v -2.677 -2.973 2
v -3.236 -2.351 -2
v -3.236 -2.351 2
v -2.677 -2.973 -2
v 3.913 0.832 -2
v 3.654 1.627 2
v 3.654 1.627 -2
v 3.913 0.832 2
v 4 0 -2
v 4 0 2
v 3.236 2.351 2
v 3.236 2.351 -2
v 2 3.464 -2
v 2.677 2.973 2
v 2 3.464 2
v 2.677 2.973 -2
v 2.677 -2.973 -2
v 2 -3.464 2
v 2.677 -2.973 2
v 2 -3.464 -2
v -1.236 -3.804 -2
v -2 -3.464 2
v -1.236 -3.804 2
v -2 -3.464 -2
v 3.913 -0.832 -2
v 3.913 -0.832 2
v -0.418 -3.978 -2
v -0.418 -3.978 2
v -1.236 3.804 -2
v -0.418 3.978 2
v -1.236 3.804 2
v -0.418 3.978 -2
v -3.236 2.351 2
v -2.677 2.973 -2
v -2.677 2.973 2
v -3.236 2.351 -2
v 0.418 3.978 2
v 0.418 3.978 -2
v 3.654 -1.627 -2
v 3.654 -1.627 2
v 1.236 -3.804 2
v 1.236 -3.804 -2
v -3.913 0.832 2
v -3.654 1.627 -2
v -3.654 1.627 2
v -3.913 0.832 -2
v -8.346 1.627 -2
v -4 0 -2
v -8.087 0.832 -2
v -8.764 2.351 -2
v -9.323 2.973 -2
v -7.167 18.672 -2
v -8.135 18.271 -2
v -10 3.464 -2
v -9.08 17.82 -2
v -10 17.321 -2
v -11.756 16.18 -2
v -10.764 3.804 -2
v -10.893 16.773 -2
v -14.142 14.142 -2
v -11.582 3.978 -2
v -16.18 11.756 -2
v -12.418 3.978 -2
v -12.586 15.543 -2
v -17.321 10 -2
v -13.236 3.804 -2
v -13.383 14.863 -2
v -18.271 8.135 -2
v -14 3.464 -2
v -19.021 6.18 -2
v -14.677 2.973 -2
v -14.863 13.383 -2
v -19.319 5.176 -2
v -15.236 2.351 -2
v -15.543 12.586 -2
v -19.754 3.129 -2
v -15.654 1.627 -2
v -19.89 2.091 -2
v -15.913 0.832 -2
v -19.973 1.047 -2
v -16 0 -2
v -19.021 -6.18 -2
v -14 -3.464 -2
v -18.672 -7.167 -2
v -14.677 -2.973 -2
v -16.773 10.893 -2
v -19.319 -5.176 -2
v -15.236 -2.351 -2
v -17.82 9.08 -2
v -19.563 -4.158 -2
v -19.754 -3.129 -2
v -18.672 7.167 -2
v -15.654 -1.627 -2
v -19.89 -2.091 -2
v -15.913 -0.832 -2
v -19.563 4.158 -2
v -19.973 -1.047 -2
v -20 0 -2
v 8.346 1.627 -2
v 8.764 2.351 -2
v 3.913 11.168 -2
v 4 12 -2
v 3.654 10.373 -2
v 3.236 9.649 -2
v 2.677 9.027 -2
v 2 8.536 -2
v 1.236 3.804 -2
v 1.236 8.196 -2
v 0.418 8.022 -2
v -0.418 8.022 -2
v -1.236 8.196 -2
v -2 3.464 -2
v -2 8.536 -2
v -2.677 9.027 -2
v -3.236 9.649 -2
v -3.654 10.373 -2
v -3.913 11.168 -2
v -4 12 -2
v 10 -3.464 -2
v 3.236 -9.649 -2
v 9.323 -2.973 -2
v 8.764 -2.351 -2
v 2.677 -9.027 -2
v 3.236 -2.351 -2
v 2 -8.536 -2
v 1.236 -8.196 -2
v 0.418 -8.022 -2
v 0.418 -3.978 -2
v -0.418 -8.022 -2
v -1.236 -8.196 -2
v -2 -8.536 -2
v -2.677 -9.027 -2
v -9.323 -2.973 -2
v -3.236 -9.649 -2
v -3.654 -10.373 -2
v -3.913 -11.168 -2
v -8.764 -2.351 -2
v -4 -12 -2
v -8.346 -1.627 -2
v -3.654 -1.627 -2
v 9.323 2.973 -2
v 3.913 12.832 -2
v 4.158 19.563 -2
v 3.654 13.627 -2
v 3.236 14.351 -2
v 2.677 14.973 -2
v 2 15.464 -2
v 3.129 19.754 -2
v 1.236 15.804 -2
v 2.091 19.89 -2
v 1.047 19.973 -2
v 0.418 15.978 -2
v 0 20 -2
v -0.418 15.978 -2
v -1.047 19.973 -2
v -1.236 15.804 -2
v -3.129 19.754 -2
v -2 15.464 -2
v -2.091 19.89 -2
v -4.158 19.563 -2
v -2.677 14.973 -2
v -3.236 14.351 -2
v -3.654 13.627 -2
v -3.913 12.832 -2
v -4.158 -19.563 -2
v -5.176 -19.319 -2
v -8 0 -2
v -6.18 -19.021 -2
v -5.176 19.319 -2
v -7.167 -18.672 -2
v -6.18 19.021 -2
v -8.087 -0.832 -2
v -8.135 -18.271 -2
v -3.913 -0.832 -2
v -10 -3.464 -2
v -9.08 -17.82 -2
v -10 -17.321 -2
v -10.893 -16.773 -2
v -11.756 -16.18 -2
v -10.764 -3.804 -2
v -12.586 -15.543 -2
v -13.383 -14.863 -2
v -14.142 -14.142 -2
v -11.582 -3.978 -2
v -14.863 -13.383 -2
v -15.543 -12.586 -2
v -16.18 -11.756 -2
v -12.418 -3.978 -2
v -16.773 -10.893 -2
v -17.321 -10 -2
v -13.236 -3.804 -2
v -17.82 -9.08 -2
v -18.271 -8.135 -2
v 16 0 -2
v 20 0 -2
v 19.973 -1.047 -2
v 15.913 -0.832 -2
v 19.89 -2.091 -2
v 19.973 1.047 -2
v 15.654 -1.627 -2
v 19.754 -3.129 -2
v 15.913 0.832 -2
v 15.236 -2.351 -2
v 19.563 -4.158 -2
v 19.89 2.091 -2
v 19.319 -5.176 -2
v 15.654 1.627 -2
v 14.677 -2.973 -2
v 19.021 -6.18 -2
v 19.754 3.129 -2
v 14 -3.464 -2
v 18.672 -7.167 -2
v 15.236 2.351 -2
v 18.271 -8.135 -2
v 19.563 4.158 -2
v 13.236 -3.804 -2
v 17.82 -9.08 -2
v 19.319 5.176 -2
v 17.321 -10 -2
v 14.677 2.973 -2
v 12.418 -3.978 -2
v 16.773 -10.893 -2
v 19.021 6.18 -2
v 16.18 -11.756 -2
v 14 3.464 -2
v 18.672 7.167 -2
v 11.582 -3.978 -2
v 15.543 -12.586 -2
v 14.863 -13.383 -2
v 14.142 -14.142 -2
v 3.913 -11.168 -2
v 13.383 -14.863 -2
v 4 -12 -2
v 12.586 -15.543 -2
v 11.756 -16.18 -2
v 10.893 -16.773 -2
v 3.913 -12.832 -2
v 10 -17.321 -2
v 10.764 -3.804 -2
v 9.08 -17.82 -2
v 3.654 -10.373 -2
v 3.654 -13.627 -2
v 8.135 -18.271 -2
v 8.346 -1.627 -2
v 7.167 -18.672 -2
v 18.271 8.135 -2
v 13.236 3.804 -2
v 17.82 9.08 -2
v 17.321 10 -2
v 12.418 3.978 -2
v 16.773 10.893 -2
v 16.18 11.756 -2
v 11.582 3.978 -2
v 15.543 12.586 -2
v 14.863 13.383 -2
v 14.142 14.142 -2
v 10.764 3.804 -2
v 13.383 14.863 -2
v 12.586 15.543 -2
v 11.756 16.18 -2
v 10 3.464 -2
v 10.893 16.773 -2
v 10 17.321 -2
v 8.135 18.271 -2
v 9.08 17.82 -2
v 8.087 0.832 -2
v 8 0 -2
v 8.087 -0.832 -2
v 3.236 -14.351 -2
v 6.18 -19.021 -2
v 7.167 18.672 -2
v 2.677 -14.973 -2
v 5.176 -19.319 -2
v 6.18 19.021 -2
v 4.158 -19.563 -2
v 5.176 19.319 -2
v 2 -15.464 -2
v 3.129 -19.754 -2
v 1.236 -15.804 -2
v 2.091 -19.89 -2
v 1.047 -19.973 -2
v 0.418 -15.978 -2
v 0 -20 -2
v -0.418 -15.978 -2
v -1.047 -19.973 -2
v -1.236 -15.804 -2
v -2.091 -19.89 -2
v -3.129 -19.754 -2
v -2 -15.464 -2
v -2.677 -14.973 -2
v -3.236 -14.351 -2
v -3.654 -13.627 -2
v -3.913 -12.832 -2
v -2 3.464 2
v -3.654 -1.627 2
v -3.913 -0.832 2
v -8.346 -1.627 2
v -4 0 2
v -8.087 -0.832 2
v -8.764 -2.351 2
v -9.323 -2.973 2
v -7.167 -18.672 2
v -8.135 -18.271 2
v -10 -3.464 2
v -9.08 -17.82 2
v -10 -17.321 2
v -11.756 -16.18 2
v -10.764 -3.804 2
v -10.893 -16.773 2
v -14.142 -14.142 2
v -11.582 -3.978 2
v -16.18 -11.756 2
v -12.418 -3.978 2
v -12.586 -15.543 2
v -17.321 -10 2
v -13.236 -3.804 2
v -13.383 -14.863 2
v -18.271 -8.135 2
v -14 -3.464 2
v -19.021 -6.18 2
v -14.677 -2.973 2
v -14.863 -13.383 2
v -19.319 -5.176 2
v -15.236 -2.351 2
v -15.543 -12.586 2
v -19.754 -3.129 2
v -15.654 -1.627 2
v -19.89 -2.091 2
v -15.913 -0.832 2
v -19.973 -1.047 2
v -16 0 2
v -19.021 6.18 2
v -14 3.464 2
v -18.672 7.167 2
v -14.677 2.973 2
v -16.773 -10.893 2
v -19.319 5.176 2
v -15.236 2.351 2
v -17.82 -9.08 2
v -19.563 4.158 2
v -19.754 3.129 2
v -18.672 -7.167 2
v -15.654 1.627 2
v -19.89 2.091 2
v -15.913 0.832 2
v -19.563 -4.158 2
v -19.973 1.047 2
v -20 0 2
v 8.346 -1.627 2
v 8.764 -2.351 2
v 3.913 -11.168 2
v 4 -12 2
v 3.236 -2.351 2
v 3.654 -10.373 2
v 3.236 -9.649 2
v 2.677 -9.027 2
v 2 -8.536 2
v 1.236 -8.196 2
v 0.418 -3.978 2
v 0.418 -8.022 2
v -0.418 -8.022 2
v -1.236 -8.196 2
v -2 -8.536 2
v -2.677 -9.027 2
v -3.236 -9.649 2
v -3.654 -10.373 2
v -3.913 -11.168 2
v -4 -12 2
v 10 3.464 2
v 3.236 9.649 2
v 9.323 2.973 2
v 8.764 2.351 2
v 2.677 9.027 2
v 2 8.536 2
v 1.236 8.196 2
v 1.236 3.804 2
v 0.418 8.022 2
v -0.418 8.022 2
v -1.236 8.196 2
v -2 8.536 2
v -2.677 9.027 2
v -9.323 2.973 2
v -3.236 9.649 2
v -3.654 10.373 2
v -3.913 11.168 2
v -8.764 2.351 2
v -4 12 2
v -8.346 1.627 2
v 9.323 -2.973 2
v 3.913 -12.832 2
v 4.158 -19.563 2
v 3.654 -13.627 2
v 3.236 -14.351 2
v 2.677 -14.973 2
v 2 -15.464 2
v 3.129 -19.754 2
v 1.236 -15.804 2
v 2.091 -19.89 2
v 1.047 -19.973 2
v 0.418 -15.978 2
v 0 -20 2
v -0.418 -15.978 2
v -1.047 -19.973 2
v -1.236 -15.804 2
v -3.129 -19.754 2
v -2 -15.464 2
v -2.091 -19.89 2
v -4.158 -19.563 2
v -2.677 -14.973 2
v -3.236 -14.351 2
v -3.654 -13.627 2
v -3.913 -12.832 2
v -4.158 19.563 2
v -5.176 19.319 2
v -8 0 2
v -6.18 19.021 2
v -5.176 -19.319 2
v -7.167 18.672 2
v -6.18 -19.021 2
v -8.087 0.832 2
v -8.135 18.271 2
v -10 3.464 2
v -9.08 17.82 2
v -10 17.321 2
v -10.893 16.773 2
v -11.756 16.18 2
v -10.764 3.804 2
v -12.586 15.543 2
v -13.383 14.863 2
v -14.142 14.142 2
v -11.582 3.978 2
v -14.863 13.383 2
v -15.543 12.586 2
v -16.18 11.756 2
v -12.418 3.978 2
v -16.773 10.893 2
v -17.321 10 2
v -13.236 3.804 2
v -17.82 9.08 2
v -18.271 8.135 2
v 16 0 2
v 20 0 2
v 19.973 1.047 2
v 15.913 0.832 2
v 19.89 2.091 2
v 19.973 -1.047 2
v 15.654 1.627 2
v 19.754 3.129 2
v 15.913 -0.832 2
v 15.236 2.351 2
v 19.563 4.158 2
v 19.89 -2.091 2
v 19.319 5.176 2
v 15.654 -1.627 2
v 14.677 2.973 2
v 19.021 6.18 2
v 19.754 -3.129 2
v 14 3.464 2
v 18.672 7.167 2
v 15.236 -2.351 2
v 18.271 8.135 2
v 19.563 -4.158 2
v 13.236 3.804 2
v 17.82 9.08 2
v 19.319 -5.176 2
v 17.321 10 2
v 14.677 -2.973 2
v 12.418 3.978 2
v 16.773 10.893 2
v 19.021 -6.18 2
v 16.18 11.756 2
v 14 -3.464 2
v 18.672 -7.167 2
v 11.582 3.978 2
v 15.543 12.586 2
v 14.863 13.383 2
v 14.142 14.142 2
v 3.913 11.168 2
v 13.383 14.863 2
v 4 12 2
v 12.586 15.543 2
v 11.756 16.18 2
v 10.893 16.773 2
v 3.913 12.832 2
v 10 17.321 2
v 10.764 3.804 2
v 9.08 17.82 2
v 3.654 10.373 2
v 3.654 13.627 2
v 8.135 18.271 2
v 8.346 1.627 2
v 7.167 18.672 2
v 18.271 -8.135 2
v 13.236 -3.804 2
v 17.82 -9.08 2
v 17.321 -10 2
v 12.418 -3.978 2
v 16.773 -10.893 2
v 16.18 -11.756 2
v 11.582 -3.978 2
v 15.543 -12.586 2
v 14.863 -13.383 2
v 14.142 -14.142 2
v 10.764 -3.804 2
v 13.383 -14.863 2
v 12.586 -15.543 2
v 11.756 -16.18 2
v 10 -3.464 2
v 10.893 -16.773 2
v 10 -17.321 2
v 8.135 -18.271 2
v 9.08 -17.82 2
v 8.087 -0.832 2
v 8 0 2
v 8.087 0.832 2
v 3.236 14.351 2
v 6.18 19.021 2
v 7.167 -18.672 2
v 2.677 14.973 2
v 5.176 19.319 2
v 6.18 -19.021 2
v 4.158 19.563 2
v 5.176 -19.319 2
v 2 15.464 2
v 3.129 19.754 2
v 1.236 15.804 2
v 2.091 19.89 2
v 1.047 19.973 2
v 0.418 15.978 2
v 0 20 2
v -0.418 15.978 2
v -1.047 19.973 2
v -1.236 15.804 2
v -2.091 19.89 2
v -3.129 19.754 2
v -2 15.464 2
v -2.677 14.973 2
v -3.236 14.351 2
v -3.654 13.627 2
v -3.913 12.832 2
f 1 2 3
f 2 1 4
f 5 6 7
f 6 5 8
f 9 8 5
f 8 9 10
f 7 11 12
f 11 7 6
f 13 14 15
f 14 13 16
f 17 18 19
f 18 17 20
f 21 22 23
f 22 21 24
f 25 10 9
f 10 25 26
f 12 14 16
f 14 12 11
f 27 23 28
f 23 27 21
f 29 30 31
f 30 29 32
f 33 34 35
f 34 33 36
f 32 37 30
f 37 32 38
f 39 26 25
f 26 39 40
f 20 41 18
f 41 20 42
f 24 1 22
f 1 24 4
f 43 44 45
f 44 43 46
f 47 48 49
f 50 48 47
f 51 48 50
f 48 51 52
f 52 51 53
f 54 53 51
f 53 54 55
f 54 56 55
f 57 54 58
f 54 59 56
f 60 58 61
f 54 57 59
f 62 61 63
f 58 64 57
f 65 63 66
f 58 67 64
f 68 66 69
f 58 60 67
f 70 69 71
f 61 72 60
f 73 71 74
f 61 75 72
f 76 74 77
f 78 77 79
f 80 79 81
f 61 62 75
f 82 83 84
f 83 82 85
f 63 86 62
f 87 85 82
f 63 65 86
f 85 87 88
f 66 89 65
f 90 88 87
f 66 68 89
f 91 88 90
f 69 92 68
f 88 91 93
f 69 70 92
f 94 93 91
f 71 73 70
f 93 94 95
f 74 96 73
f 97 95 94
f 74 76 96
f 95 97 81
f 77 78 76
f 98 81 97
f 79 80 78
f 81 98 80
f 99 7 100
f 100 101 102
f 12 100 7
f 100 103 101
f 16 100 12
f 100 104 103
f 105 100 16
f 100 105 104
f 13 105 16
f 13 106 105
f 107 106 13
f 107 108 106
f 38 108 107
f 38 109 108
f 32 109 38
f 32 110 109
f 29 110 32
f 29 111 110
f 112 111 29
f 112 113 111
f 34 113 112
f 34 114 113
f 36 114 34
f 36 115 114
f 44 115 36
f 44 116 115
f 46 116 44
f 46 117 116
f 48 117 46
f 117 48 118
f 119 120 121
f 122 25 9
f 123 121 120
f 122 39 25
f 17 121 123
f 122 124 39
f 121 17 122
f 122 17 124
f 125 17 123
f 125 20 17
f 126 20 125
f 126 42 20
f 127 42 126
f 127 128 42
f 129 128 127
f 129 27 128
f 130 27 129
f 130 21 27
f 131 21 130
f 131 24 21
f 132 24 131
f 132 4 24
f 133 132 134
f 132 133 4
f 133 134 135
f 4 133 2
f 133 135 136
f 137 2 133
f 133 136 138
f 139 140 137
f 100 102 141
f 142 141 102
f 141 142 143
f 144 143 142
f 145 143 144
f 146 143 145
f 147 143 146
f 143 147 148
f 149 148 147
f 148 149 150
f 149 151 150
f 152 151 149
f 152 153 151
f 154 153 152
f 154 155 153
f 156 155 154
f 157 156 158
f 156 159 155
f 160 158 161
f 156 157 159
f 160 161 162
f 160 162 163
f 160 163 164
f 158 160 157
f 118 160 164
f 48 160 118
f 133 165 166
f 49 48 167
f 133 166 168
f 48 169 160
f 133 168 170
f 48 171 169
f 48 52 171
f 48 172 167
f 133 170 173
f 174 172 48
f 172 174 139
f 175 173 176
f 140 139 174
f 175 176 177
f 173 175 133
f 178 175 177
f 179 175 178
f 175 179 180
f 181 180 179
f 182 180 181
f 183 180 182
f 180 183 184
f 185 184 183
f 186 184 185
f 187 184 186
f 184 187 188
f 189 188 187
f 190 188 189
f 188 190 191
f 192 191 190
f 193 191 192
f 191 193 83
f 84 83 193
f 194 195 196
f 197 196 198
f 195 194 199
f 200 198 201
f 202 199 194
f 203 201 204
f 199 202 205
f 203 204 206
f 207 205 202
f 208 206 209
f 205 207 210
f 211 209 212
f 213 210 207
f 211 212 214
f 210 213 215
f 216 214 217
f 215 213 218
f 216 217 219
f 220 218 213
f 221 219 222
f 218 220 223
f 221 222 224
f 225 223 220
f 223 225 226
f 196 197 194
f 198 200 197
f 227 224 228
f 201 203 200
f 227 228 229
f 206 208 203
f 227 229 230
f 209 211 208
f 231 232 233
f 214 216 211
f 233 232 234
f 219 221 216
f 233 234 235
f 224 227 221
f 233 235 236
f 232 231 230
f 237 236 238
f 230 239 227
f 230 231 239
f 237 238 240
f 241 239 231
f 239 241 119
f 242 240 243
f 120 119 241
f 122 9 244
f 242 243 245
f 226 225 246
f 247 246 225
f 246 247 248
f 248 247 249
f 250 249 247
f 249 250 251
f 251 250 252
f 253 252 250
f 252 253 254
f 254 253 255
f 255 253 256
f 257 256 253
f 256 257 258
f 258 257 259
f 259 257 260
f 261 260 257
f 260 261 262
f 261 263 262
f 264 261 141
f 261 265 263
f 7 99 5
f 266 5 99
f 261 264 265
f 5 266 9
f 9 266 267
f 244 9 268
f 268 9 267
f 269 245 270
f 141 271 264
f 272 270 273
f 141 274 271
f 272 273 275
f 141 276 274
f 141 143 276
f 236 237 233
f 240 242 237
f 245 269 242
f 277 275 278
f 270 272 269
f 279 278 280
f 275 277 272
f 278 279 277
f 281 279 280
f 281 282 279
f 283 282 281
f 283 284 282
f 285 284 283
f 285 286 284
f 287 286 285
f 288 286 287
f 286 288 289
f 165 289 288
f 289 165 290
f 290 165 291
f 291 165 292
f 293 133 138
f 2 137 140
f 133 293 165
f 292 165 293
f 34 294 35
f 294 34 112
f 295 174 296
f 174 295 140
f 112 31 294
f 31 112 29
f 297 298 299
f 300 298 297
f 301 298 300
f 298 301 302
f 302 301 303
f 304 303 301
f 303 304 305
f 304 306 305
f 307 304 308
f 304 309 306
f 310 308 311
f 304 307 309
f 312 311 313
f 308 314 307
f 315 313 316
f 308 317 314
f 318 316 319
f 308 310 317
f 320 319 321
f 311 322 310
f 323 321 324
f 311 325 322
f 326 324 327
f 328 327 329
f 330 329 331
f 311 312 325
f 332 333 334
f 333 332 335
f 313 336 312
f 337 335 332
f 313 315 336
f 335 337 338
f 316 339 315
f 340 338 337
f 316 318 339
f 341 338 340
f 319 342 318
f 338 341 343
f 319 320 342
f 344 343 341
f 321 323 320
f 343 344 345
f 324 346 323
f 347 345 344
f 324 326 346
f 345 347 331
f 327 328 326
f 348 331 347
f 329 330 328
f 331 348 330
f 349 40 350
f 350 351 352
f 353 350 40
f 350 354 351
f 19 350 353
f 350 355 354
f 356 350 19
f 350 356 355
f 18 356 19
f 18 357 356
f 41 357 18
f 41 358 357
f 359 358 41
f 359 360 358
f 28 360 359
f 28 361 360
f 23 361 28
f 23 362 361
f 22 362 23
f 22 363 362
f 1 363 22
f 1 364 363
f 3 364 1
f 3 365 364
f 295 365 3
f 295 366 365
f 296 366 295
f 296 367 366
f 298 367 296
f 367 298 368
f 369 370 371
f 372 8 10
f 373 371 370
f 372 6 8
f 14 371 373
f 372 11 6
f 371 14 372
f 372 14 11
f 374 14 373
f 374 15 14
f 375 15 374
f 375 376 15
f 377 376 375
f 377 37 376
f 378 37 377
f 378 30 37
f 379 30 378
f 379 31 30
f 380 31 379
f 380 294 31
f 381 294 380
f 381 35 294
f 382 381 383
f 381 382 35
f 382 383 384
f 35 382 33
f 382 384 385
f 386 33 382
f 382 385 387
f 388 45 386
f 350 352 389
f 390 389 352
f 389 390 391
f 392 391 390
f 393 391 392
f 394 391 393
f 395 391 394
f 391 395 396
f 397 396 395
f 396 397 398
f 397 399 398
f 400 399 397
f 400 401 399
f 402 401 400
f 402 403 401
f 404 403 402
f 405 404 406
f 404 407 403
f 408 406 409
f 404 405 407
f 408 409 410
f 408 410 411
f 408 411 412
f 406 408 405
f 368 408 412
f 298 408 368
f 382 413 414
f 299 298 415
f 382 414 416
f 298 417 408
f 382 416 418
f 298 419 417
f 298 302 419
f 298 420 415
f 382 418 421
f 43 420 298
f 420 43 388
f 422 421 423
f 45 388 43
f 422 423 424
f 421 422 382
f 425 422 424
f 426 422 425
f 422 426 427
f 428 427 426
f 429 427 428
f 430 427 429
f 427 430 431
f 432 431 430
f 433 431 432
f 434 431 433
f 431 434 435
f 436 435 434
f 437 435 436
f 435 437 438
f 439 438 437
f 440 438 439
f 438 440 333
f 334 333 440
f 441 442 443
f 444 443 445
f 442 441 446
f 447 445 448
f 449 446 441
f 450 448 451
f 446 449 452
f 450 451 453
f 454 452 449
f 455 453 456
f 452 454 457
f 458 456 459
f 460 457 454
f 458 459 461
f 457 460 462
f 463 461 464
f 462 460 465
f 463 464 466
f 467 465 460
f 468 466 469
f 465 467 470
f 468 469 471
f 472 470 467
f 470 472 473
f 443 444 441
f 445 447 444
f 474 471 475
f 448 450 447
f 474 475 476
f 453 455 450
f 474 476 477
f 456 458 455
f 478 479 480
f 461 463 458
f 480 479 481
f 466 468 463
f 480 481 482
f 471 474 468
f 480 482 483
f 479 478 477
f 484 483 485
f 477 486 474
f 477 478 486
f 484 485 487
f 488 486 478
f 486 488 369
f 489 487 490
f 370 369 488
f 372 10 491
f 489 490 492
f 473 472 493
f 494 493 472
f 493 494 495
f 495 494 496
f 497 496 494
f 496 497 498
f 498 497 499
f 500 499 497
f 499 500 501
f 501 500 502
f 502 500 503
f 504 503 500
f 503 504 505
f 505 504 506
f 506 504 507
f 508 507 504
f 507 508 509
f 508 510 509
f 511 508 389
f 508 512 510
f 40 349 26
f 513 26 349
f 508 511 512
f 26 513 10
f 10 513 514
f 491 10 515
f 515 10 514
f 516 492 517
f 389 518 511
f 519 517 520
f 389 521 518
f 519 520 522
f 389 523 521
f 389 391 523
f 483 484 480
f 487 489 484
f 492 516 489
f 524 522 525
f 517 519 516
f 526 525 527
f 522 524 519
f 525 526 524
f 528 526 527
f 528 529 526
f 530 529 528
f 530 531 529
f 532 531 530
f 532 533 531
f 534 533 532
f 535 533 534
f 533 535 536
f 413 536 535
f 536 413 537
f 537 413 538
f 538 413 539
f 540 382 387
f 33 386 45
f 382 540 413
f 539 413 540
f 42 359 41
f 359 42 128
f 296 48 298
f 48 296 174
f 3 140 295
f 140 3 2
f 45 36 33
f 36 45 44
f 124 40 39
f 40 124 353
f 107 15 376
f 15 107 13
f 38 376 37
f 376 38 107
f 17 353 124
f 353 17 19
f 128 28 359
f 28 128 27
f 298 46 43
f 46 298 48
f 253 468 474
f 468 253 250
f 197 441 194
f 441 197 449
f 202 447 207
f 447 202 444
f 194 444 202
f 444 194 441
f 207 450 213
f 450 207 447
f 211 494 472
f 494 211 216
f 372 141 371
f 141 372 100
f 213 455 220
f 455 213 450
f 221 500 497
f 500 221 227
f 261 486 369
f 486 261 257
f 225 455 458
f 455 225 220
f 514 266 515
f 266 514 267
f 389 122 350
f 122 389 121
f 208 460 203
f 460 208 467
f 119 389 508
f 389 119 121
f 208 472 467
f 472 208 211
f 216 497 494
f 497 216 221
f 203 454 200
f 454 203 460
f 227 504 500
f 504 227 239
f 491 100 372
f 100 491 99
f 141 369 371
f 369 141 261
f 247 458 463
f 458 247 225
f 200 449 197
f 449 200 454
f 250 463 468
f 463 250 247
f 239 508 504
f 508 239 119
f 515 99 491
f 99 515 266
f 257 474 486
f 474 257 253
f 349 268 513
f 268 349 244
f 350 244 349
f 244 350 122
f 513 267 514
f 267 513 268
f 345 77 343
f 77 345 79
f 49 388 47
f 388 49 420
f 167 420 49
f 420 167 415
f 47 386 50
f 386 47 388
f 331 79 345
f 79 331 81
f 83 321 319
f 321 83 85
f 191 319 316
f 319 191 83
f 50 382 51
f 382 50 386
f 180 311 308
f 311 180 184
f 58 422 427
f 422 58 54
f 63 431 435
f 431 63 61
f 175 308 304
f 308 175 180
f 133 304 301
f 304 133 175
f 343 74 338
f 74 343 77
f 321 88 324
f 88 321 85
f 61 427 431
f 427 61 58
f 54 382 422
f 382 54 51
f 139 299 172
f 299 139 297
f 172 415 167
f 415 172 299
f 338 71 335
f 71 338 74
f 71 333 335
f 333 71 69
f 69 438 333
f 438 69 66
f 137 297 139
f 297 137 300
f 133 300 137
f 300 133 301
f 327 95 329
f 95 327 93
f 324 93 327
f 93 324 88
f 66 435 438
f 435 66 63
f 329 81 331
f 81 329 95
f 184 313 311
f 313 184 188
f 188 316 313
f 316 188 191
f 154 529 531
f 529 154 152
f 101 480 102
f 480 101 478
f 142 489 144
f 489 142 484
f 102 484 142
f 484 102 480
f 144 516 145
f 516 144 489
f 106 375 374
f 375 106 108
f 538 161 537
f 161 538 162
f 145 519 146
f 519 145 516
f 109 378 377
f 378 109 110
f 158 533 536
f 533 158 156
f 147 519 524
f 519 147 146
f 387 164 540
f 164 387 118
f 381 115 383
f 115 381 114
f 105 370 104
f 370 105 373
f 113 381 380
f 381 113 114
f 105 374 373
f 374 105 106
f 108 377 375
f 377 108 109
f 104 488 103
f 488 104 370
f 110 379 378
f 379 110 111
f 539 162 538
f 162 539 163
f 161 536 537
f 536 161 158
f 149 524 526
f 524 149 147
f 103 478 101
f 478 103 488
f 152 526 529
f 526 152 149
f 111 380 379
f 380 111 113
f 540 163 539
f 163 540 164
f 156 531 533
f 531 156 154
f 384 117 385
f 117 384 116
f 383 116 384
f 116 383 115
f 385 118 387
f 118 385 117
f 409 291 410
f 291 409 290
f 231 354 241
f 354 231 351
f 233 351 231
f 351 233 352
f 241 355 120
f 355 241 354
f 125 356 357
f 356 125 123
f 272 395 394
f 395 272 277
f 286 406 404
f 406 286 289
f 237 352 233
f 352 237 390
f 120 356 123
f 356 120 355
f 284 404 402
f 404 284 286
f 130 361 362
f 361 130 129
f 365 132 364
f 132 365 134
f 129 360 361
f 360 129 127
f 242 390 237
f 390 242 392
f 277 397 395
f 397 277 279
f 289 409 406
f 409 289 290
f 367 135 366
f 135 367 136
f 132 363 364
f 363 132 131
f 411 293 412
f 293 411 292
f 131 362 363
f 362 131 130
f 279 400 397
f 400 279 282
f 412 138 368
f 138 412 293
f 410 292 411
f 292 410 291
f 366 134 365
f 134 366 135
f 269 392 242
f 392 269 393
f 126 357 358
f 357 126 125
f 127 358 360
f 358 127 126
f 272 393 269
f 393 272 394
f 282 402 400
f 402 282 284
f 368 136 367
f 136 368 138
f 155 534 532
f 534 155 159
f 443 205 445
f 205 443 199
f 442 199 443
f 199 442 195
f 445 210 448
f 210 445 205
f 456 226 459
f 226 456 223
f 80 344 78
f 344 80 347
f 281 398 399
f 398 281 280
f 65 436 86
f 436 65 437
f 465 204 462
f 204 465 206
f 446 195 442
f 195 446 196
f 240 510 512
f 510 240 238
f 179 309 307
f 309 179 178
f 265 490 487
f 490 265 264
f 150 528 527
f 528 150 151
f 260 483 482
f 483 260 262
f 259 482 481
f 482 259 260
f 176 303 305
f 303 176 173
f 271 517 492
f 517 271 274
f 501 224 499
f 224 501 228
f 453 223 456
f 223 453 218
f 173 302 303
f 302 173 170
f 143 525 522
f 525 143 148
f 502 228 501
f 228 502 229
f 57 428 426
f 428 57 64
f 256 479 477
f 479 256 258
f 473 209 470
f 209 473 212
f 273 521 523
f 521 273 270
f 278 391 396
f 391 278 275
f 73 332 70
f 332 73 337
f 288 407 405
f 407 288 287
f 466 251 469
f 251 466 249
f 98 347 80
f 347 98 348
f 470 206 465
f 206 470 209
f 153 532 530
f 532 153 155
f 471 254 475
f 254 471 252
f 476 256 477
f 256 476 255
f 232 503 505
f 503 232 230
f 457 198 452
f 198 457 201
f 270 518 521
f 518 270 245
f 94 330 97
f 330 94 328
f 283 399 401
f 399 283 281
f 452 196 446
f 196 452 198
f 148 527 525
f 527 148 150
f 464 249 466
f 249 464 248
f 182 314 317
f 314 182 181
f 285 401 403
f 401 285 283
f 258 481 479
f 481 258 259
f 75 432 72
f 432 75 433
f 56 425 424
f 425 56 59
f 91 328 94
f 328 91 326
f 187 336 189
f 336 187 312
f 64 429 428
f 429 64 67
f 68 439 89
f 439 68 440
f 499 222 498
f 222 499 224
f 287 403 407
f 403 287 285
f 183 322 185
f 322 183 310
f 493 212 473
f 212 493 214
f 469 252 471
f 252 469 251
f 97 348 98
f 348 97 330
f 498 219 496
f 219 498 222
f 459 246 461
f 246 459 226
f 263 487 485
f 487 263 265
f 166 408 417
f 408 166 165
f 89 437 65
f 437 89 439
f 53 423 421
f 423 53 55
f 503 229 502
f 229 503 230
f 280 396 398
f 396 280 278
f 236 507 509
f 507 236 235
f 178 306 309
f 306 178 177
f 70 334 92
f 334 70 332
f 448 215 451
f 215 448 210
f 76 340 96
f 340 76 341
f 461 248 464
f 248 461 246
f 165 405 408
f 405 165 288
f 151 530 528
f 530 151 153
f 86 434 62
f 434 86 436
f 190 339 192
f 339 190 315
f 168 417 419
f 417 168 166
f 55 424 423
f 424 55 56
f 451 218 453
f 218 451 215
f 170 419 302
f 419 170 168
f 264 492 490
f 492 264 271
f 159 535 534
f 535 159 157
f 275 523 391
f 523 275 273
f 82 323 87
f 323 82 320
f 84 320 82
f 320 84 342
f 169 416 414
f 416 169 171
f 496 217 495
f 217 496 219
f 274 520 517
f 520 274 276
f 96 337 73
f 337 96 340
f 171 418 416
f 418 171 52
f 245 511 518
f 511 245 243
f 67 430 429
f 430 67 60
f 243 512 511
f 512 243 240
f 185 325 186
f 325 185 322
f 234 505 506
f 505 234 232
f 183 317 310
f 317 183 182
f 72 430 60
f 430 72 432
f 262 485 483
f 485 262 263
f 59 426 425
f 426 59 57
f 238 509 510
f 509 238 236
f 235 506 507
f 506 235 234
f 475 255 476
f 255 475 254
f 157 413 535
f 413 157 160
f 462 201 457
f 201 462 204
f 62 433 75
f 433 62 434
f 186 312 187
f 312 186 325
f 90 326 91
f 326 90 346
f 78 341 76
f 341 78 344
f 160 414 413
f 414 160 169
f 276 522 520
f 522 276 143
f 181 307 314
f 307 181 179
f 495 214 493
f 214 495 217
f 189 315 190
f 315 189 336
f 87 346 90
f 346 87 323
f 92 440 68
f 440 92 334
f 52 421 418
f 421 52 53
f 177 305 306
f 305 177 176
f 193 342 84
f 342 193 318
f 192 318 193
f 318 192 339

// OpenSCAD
module plugs() {
	cylinder(d = 8, h = 4, center = true, $fn = 30);
	translate([12, 0, 0]) cylinder(d = 8, h = 4, center = true, $fn = 30);
	translate([-12, 0, 0]) cylinder(d = 8, h = 4, center = true, $fn = 30);
	translate([0, 12, 0]) cylinder(d = 8, h = 4, center = true, $fn = 30);
	translate([0, -12, 0]) cylinder(d = 8, h = 4, center = true, $fn = 30);
}

difference() {
	cylinder(d = 40, h = 4, center = true, $fn = 120);
	#translate([0,0,0]) plugs();
}
